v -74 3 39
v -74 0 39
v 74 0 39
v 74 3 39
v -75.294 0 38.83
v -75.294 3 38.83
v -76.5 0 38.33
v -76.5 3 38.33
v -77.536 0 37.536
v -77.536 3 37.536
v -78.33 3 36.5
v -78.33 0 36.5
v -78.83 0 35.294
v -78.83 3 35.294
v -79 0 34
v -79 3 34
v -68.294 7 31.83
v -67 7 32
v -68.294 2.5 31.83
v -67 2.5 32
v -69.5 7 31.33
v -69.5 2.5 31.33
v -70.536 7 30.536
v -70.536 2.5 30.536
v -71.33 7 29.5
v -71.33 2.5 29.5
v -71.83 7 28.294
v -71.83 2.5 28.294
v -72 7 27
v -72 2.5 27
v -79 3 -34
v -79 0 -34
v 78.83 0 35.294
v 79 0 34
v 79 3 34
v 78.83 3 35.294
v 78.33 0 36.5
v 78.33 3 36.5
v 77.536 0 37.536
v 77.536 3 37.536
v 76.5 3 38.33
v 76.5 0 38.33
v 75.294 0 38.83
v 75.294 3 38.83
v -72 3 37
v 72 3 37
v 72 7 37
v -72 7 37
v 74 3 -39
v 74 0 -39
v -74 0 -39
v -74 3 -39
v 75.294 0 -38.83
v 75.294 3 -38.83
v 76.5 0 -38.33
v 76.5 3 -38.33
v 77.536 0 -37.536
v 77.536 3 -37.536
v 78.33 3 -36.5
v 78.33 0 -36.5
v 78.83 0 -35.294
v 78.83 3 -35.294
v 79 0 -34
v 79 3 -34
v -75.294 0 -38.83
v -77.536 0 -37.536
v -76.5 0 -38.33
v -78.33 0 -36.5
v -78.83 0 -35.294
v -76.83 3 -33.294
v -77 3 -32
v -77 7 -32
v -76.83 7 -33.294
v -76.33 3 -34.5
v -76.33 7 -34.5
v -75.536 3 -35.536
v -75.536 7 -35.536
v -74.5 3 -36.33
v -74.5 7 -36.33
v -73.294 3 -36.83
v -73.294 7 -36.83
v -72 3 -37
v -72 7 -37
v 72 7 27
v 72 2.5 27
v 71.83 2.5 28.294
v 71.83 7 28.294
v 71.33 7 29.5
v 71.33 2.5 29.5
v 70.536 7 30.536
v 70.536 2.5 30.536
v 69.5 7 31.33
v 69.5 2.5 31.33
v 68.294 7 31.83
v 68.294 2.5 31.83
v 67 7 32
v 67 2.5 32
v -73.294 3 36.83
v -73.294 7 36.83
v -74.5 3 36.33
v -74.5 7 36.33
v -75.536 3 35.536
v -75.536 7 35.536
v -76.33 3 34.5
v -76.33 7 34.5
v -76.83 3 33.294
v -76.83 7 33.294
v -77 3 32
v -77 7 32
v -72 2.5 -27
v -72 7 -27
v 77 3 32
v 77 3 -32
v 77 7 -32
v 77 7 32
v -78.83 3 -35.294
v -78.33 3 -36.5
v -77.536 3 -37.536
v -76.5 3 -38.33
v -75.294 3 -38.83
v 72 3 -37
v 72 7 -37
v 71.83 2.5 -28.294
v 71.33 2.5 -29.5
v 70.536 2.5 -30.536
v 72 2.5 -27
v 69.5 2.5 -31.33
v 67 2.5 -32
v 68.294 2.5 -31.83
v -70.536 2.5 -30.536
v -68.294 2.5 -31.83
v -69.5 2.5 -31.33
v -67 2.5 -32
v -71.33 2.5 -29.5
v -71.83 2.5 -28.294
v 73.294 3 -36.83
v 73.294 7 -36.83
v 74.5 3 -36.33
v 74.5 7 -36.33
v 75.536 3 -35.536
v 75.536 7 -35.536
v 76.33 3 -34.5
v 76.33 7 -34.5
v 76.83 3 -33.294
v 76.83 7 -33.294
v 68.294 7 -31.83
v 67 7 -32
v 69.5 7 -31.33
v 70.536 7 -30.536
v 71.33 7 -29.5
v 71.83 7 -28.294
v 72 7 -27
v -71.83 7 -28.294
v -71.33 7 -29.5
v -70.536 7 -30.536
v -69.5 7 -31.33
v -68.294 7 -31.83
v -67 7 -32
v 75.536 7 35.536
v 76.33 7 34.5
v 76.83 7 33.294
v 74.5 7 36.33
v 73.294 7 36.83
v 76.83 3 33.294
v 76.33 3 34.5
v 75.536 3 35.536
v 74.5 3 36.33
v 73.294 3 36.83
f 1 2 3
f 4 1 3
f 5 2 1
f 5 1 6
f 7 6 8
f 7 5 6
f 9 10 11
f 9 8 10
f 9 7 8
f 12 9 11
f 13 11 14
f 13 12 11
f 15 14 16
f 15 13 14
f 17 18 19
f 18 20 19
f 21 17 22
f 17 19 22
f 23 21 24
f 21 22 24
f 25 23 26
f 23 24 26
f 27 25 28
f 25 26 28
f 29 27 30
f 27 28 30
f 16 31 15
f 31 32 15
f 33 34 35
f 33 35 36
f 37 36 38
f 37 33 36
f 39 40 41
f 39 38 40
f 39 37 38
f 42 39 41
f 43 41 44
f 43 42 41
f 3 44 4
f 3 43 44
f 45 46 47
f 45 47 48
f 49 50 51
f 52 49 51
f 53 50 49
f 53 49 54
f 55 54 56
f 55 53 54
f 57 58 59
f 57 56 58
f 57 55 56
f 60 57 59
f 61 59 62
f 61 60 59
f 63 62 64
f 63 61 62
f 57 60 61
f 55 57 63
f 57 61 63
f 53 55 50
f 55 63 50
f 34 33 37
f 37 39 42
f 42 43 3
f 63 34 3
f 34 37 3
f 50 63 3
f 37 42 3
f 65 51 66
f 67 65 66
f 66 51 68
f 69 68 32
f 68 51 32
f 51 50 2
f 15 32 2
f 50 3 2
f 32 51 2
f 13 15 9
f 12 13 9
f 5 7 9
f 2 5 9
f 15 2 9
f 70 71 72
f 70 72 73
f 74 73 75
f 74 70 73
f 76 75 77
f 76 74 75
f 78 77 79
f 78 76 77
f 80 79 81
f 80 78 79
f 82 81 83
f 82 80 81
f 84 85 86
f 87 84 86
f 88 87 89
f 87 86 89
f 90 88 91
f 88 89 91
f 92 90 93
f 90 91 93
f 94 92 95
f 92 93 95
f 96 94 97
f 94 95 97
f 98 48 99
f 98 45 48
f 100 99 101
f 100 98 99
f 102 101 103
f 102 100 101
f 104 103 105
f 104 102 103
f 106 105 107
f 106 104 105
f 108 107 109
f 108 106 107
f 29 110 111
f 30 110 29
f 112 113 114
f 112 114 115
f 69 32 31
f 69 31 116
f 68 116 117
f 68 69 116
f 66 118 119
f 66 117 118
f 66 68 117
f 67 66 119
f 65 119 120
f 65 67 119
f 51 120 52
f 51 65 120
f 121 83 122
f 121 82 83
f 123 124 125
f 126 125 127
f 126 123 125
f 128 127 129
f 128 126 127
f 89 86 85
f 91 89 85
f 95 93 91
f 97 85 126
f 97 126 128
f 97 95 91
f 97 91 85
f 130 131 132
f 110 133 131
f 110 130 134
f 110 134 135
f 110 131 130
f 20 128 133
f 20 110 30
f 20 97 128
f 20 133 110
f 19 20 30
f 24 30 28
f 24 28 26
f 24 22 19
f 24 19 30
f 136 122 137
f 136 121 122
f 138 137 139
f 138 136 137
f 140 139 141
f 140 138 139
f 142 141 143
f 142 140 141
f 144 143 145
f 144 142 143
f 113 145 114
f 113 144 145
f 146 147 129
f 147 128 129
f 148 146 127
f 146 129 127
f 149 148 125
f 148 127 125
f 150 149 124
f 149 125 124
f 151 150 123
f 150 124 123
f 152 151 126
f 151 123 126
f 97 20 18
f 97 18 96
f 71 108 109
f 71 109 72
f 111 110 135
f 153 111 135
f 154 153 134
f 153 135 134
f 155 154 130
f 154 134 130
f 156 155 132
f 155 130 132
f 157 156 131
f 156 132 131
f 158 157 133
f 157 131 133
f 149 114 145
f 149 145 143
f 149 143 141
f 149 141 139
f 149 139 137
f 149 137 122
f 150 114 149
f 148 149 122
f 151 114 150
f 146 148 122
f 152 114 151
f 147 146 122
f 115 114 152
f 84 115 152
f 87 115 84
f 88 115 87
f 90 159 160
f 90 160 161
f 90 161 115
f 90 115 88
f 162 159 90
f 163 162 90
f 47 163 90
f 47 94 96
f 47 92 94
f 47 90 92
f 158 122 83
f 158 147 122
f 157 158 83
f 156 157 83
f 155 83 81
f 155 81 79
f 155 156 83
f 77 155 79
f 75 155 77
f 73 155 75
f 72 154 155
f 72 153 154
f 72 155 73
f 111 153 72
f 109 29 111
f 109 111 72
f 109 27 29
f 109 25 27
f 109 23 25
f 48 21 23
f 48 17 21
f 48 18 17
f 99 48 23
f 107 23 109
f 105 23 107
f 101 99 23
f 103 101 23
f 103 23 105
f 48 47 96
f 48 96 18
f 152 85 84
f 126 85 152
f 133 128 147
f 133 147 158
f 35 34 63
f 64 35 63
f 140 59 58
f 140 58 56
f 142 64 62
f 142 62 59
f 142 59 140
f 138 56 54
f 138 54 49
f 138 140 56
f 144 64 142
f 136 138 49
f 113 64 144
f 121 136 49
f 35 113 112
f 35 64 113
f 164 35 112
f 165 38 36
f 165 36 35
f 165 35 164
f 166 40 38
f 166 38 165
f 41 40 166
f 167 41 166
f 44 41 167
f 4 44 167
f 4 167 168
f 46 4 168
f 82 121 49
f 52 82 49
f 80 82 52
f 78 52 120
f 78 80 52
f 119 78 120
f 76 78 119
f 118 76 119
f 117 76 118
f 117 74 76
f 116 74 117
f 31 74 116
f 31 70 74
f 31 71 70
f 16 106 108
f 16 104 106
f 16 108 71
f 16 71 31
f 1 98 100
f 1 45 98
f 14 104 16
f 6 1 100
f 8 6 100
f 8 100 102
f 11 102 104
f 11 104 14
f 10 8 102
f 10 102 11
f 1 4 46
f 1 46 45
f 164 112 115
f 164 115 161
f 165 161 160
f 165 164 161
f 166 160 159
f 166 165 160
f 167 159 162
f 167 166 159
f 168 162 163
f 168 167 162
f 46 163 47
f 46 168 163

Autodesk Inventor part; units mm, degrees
ref_plane "YZ Plane" through (0, 0, 0) normal (1, 0, 0) x (0, 1, 0)
ref_plane "XZ Plane" through (0, 0, 0) normal (0, 1, 0) x (-1, 0, 0)
ref_plane "XY Plane" through (0, 0, 0) normal (0, 0, 1) x (1, 0, 0)
sketch "Sketch1" plane through (0, 0, 0) normal (0, 1, 0) x (-1, 0, 0)
  line L0 (-70, 35) -> (70, 35)
  line L1 (75, 30) -> (75, -30)
  line L2 (70, -35) -> (-70, -35)
  line L3 (-75, -30) -> (-75, 30)
  line L4 (-75, 35) -> (75, -35) construction
  line L5 (75, 35) -> (-75, -35) construction
  arc A0 (75, 30) -> (70, 35) centre (70, 30) ccw
  arc A1 (70, -35) -> (75, -30) centre (70, -30) ccw
  arc A2 (-70, 35) -> (-75, 30) centre (-70, 30) ccw
  arc A3 (-75, -30) -> (-70, -35) centre (-70, -30) ccw
  line L6 (-72, 37) -> (72, 37)
  line L7 (77, 32) -> (77, -32)
  line L8 (72, -37) -> (-72, -37)
  line L9 (-77, -32) -> (-77, 32)
  line L10 (-77, 37) -> (77, -37) construction
  line L11 (77, 37) -> (-77, -37) construction
  arc A4 (77, 32) -> (72, 37) centre (72, 32) ccw
  arc A5 (72, -37) -> (77, -32) centre (72, -32) ccw
  arc A6 (-77, -32) -> (-72, -37) centre (-72, -32) ccw
  arc A7 (-72, 37) -> (-77, 32) centre (-72, 32) ccw
  line L12 (74, 39) -> (-74, 39)
  line L13 (-79, 34) -> (-79, -34)
  line L14 (-74, -39) -> (74, -39)
  line L15 (79, -34) -> (79, 34)
  line L16 (79, 39) -> (-79, -39) construction
  line L17 (-79, 39) -> (79, -39) construction
  arc A8 (79, 34) -> (74, 39) centre (74, 34) ccw
  arc A9 (-74, 39) -> (-79, 34) centre (-74, 34) ccw
  arc A10 (-79, -34) -> (-74, -39) centre (-74, -34) ccw
  arc A11 (74, -39) -> (79, -34) centre (74, -34) ccw
  line L18 (-22.75, 23.25) -> (-35.25, 23.25) construction
  line L19 (-35.25, 23.25) -> (-35.25, 19) construction
  line L20 (-35.25, 10.75) -> (-22.75, 10.75) construction
  line L21 (-22.75, 10.75) -> (-22.75, 15) construction
  line L22 (56.9183, 17) -> (21.35, 17) construction
  line L23 (40.8, -24) -> (40.8, -20.1) construction
  line L24 (-55.8, 24) -> (-55.8, 12) construction
  line L25 (-20.25, 15.5) -> (-22.25, 15.5) construction
  line L26 (-22.25, 18.5) -> (-20.25, 18.5) construction
  line L27 (-35.75, 15.5) -> (-37.75, 15.5) construction
  line L28 (-37.75, 18.5) -> (-35.75, 18.5) construction
  line L29 (-40.55, 18.5) -> (-53.5, 18.5) construction
  line L30 (-40.55, 15.5) -> (-53.5, 15.5) construction
  line L31 (-60, 8.5) -> (45, 8.5) construction
  line L32 (38.5, 20.5) -> (37, 20.5) construction
  line L33 (37, 13.5) -> (38.5, 13.5) construction
  line L34 (-60, 5) -> (-60, -25) construction
  line L35 (21.35, -8.5) -> (45, -8.5) construction
  line L36 (-29, 20.0147) -> (-29, -25.5) construction
  line L37 (31.2062, 0) -> (-4.2501, 0) construction
  line L38 (-35.25, 6.25) -> (-35.25, 2) construction
  line L39 (-22.75, 6.25) -> (-35.25, 6.25) construction
  line L40 (-22.75, -6.25) -> (-22.75, -2) construction
  line L41 (-35.25, -6.25) -> (-22.75, -6.25) construction
  line L42 (-22.25, 1.5) -> (-20.25, 1.5) construction
  line L43 (-20.25, -1.5) -> (-22.25, -1.5) construction
  line L44 (38.5, 3.5) -> (37, 3.5) construction
  line L45 (37, -3.5) -> (38.5, -3.5) construction
  line L46 (-22.75, -10.75) -> (-35.25, -10.75) construction
  line L47 (-22.75, -23.25) -> (-22.75, -19) construction
  line L48 (-35.25, -23.25) -> (-22.75, -23.25) construction
  line L49 (56.3008, -17) -> (21.35, -17) construction
  line L50 (38.5, -13.5) -> (37, -13.5) construction
  line L51 (37, -20.5) -> (38.5, -20.5) construction
  line L52 (-20.25, -18.5) -> (-22.25, -18.5) construction
  line L53 (44.5, 5.5) -> (43.5, 5.5) construction
  line L54 (41.3, 11.5) -> (43.5, 11.5) construction
  line L55 (-37.75, -15.5) -> (-35.75, -15.5) construction
  line L56 (-35.75, -18.5) -> (-37.75, -18.5) construction
  line L57 (-40.55, -18.5) -> (-53.5, -18.5) construction
  line L58 (-37.75, 1.5) -> (-35.75, 1.5) construction
  line L59 (-35.75, -1.5) -> (-37.75, -1.5) construction
  line L60 (-40.55, -1.5) -> (-53.5, -1.5) construction
  line L61 (-58.5, 5.5) -> (-59.5, 5.5) construction
  line L62 (-59.5, 11.5) -> (-58.5, 11.5) construction
  line L63 (38.5, 5.5) -> (37, 5.5) construction
  line L64 (37, 5.5) -> (37, 11.5) construction
  line L65 (37, 11.5) -> (38.5, 11.5) construction
  line L66 (-53.5, 5.5) -> (-52.5, 5.5) construction
  line L67 (-52.5, 5.5) -> (-52.5, 11.5) construction
  line L68 (-52.5, 11.5) -> (-53.5, 11.5) construction
  line L69 (-54, 24) -> (-54, 19) construction
  line L70 (-54, 5) -> (-54, 2) construction
  arc A12 (-12.95, 13.5) -> (-12.95, 3.5) centre (-12.95, 8.5) ccw construction
  arc A13 (31, 3.5) -> (31, 13.5) centre (31, 8.5) ccw construction
  arc A14 (-12.95, -3.5) -> (-12.95, -13.5) centre (-12.95, -8.5) ccw construction
  arc A15 (31, -13.5) -> (31, -3.5) centre (31, -8.5) ccw construction
  line L71 (-12.95, 13.5) -> (31, 13.5) construction
  line L72 (-12.95, 3.5) -> (31, 3.5) construction
  line L73 (-12.95, -3.5) -> (31, -3.5) construction
  line L74 (-12.95, -13.5) -> (31, -13.5) construction
  arc A16 (-45.05, -13.5) -> (-45.05, -3.5) centre (-45.05, -8.5) ccw construction
  line L75 (43.5, -24) -> (43.5, -19.6) construction
  line L76 (-58.5, 24) -> (-58.5, 11.5) construction
  arc A17 (-46, -3.5) -> (-46, -13.5) centre (-46, -8.5) ccw construction
  arc A18 (-46, 13.5) -> (-46, 3.5) centre (-46, 8.5) ccw construction
  line L77 (-45.05, -13.5) -> (-46, -13.5) construction
  line L78 (-46, -3.5) -> (-45.05, -3.5) construction
  line L79 (-46, 3.5) -> (-45.05, 3.5) construction
  line L80 (-45.05, 13.5) -> (-46, 13.5) construction
  arc A19 (-45.05, 3.5) -> (-45.05, 13.5) centre (-45.05, 8.5) ccw construction
  line L81 (29.8763, -15.5) -> (-17.45, -15.5) construction
  line L82 (29.8763, -18.5) -> (-17.45, -18.5) construction
  line L83 (29.8763, -1.5) -> (-17.45, -1.5) construction
  line L84 (29.8763, 1.5) -> (-17.45, 1.5) construction
  line L85 (29.8763, 15.5) -> (-17.45, 15.5) construction
  line L86 (29.8763, 18.5) -> (-17.45, 18.5) construction
  arc A20 (32, -14.4) -> (29.8763, -15.5) centre (32, -17) ccw construction
  arc A21 (29.8763, -18.5) -> (32, -19.6) centre (32, -17) ccw construction
  arc A22 (32, 2.6) -> (29.8763, 1.5) centre (32, 0) ccw construction
  arc A23 (29.8763, -1.5) -> (32, -2.6) centre (32, 0) ccw construction
  arc A24 (32, 19.6) -> (29.8763, 18.5) centre (32, 17) ccw construction
  arc A25 (29.8763, 15.5) -> (32, 14.4) centre (32, 17) ccw construction
  arc A26 (34.4725, -25.0625) -> (31, -22) centre (31, -25.5) ccw construction
  arc A27 (-12.95, -22) -> (-16.4225, -25.0625) centre (-12.95, -25.5) ccw construction
  arc A28 (35.7697, -24) -> (31, -20.5) centre (31, -25.5) ccw construction
  line L87 (31, -20.5) -> (-12.95, -20.5) construction
  line L88 (34.9686, -25.5) -> (44.5, -25.5) construction
  line L89 (31, -22) -> (-12.95, -22) construction
  arc A29 (-12.95, -20.5) -> (-17.7197, -24) centre (-12.95, -25.5) ccw construction
  arc A30 (-17.6941, 23.9209) -> (-12.95, 20.5) centre (-12.95, 25.5) ccw construction
  arc A31 (-16.4225, 25.0625) -> (-12.95, 22) centre (-12.95, 25.5) ccw construction
  line L90 (31, 22) -> (-12.95, 22) construction
  line L91 (31, 20.5) -> (-12.95, 20.5) construction
  line L92 (35.7697, 24) -> (40.8, 24) construction
  line L93 (44.5, 25.5) -> (34.9686, 25.5) construction
  arc A32 (31, 22) -> (34.4725, 25.0625) centre (31, 25.5) ccw construction
  arc A33 (31, 20.5) -> (35.7697, 24) centre (31, 25.5) ccw construction
  arc A34 (-41.5775, -25.0625) -> (-45.05, -22) centre (-45.05, -25.5) ccw construction
  arc A35 (-46, -22) -> (-49.4725, -25.0625) centre (-46, -25.5) ccw construction
  line L94 (-45.05, -20.5) -> (-46, -20.5) construction
  line L95 (-45.05, -22) -> (-46, -22) construction
  arc A36 (-46, -20.5) -> (-50.7697, -24) centre (-46, -25.5) ccw construction
  arc A37 (-40.2803, -24) -> (-45.05, -20.5) centre (-45.05, -25.5) ccw construction
  line L96 (-17.7197, -24) -> (-40.2803, -24) construction
  line L97 (-50.7697, -24) -> (-58.5, -24) construction
  line L98 (-59.5, -25.5) -> (-49.9686, -25.5) construction
  line L99 (-17.2197, -25.5) -> (-16.9186, -25.5) construction
  line L100 (-45.05, 20.5) -> (-46, 20.5) construction
  line L101 (-45.05, 22) -> (-46, 22) construction
  arc A38 (-49.4725, 25.0625) -> (-46, 22) centre (-46, 25.5) ccw construction
  arc A39 (-45.05, 22) -> (-41.5775, 25.0625) centre (-45.05, 25.5) ccw construction
  arc A40 (-50.7697, 24) -> (-46, 20.5) centre (-46, 25.5) ccw construction
  arc A41 (-45.05, 20.5) -> (-40.336, 23.8333) centre (-45.05, 25.5) ccw construction
  line L102 (-16.9186, 25.5) -> (-17.2197, 25.5) construction
  line L103 (-49.9686, 25.5) -> (-59.5, 25.5) construction
  line L104 (-58.5, 24) -> (-50.7697, 24) construction
  line L105 (-40.3074, 24) -> (-17.7197, 24) construction
  line L106 (-17.7197, -24) -> (-17.7197, -25) construction
  line L107 (-40.2803, -24) -> (-40.2803, -25) construction
  line L108 (-40.3074, 24) -> (-40.3074, 25) construction
  line L109 (-17.7197, 24.0788) -> (-17.7197, 25) construction
  line L110 (43.5, 11.5) -> (44.5, 11.5) construction
  line L111 (43.5, 5.5) -> (41.3, 5.5) construction
  line L112 (-56.3, 11.5) -> (-58.5, 11.5) construction
  line L113 (-56.3, 5.5) -> (-58.5, 5.5) construction
  line L114 (-17.95, -21) -> (-19.75, -21) construction
  line L115 (-19.75, -13) -> (-17.95, -13) construction
  line L116 (-17.95, -4) -> (-19.75, -4) construction
  line L117 (-19.75, 4) -> (-17.95, 4) construction
  line L118 (-17.95, 13) -> (-19.75, 13) construction
  line L119 (-19.75, 21) -> (-17.95, 21) construction
  line L120 (-38.25, -21) -> (-40.05, -21) construction
  line L121 (-40.05, -13) -> (-38.25, -13) construction
  line L122 (-38.25, -4) -> (-40.05, -4) construction
  line L123 (-40.05, 4) -> (-38.25, 4) construction
  line L124 (-38.25, 13) -> (-40.05, 13) construction
  line L125 (-40.05, 21) -> (-38.25, 21) construction
  line L126 (-17.95, -13) -> (-17.95, -15) construction
  line L127 (-17.95, -19) -> (-17.95, -21) construction
  line L128 (-19.75, -21) -> (-19.75, -19) construction
  line L129 (-17.95, 4) -> (-17.95, 2) construction
  line L130 (-17.95, -2) -> (-17.95, -4) construction
  line L131 (-19.75, -4) -> (-19.75, -2) construction
  line L132 (-19.75, 2) -> (-19.75, 4) construction
  line L133 (-17.95, 21) -> (-17.95, 19) construction
  line L134 (-17.95, 15) -> (-17.95, 13) construction
  line L135 (-19.75, 13) -> (-19.75, 15) construction
  line L136 (-19.75, 19) -> (-19.75, 21) construction
  line L137 (-38.25, -13) -> (-38.25, -15) construction
  line L138 (-38.25, -19) -> (-38.25, -21) construction
  line L139 (-40.05, -21) -> (-40.05, -19) construction
  line L140 (-40.05, -15) -> (-40.05, -13) construction
  line L141 (-38.25, 4) -> (-38.25, 2) construction
  line L142 (-38.25, -2) -> (-38.25, -4) construction
  line L143 (-40.05, -4) -> (-40.05, -2) construction
  line L144 (-40.05, 2) -> (-40.05, 4) construction
  line L145 (-38.25, 21) -> (-38.25, 19) construction
  line L146 (-38.25, 15) -> (-38.25, 13) construction
  line L147 (-40.05, 13) -> (-40.05, 15) construction
  line L148 (-40.05, 19) -> (-40.05, 21) construction
  line L149 (38.5, -11.5) -> (37, -11.5) construction
  line L150 (37, -11.5) -> (37, -5.5) construction
  line L151 (37, -5.5) -> (38.5, -5.5) construction
  line L152 (39, -21) -> (39, -24) construction
  arc A42 (-19.75, -19) -> (-20.25, -18.5) centre (-20.25, -19) ccw construction
  arc A43 (-17.45, -18.5) -> (-17.95, -19) centre (-17.45, -19) ccw construction
  arc A44 (-19.75, -2) -> (-20.25, -1.5) centre (-20.25, -2) ccw construction
  arc A45 (-17.45, -1.5) -> (-17.95, -2) centre (-17.45, -2) ccw construction
  arc A46 (-17.95, 2) -> (-17.45, 1.5) centre (-17.45, 2) ccw construction
  arc A47 (-20.25, 1.5) -> (-19.75, 2) centre (-20.25, 2) ccw construction
  arc A48 (-19.75, 15) -> (-20.25, 15.5) centre (-20.25, 15) ccw construction
  arc A49 (-17.45, 15.5) -> (-17.95, 15) centre (-17.45, 15) ccw construction
  arc A50 (-17.95, 19) -> (-17.45, 18.5) centre (-17.45, 19) ccw construction
  arc A51 (-20.25, 18.5) -> (-19.75, 19) centre (-20.25, 19) ccw construction
  arc A52 (-38.25, 19) -> (-37.75, 18.5) centre (-37.75, 19) ccw construction
  arc A53 (-40.55, 18.5) -> (-40.05, 19) centre (-40.55, 19) ccw construction
  arc A54 (-40.05, 15) -> (-40.55, 15.5) centre (-40.55, 15) ccw construction
  arc A55 (-37.75, 15.5) -> (-38.25, 15) centre (-37.75, 15) ccw construction
  arc A56 (-38.25, 2) -> (-37.75, 1.5) centre (-37.75, 2) ccw construction
  arc A57 (-40.55, 1.5) -> (-40.05, 2) centre (-40.55, 2) ccw construction
  arc A58 (-40.05, -2) -> (-40.55, -1.5) centre (-40.55, -2) ccw construction
  arc A59 (-37.75, -1.5) -> (-38.25, -2) centre (-37.75, -2) ccw construction
  arc A60 (-38.25, -15) -> (-37.75, -15.5) centre (-37.75, -15) ccw construction
  arc A61 (-40.55, -15.5) -> (-40.05, -15) centre (-40.55, -15) ccw construction
  arc A62 (-37.75, -18.5) -> (-38.25, -19) centre (-37.75, -19) ccw construction
  arc A63 (-40.05, -19) -> (-40.55, -18.5) centre (-40.55, -19) ccw construction
  line L153 (36.5, -19.6) -> (32, -19.6) construction
  line L154 (37, -13.5) -> (37, -13.9) construction
  line L155 (32, -14.4) -> (36.5, -14.4) construction
  line L156 (36.5, -2.6) -> (32, -2.6) construction
  line L157 (37, 3.5) -> (37, 3.1) construction
  line L158 (37, -3.1) -> (37, -3.5) construction
  line L159 (32, 2.6) -> (36.5, 2.6) construction
  line L160 (36.5, 14.4) -> (32, 14.4) construction
  line L161 (37, 20.5) -> (37, 20.1) construction
  line L162 (37, 13.9) -> (37, 13.5) construction
  line L163 (32, 19.6) -> (36.5, 19.6) construction
  arc A64 (36.5, -14.4) -> (37, -13.9) centre (36.5, -13.9) ccw construction
  arc A65 (39, -12) -> (38.5, -11.5) centre (38.5, -12) ccw construction
  arc A66 (38.5, -5.5) -> (39, -5) centre (38.5, -5) ccw construction
  arc A67 (39, 5) -> (38.5, 5.5) centre (38.5, 5) ccw construction
  arc A68 (38.5, 11.5) -> (39, 12) centre (38.5, 12) ccw construction
  arc A69 (37, -3.1) -> (36.5, -2.6) centre (36.5, -3.1) ccw construction
  arc A70 (36.5, 2.6) -> (37, 3.1) centre (36.5, 3.1) ccw construction
  arc A71 (37, 13.9) -> (36.5, 14.4) centre (36.5, 13.9) ccw construction
  arc A72 (36.5, 19.6) -> (37, 20.1) centre (36.5, 20.1) ccw construction
  line L164 (43.5, -2.6) -> (43.5, 2.6) construction
  line L165 (43.5, -2.6) -> (41.3, -2.6) construction
  line L166 (37, -20.5) -> (37, -20.1) construction
  arc A73 (37, -20.1) -> (36.5, -19.6) centre (36.5, -20.1) ccw construction
  line L167 (39, -13) -> (39, -12) construction
  line L168 (39, 4) -> (39, 5) construction
  line L169 (39, 21) -> (39, 24) construction
  line L170 (43.5, -19.6) -> (43.5, -14.4) construction
  line L171 (43.5, -19.6) -> (41.3, -19.6) construction
  line L172 (43.5, -24) -> (40.8, -24) construction
  line L173 (40.8, -24) -> (39, -24) construction
  line L174 (39, -24) -> (35.7697, -24) construction
  line L175 (41.3, -14.4) -> (43.5, -14.4) construction
  line L176 (43.5, -14.4) -> (43.5, -2.6) construction
  line L177 (40.8, -13.9) -> (40.8, -3.1) construction
  line L178 (39, -4) -> (39, -5) construction
  line L179 (43.5, 2.6) -> (43.5, 5.5) construction
  line L180 (41.3, 2.6) -> (43.5, 2.6) construction
  line L181 (40.8, 3.1) -> (40.8, 5) construction
  line L182 (43.5, 14.4) -> (43.5, 19.6) construction
  line L183 (43.5, 14.4) -> (41.3, 14.4) construction
  line L184 (45, -25) -> (45, 5) construction
  line L185 (43.5, 19.6) -> (43.5, 24) construction
  line L186 (40.8, 20.1) -> (40.8, 24) construction
  line L187 (41.3, 19.6) -> (43.5, 19.6) construction
  line L188 (43.5, 11.5) -> (43.5, 14.4) construction
  line L189 (40.8, 24) -> (43.5, 24) construction
  line L190 (40.8, 12) -> (40.8, 13.9) construction
  line L191 (39, 13) -> (39, 12) construction
  arc A74 (38.5, -13.5) -> (39, -13) centre (38.5, -13) ccw construction
  arc A75 (39, -4) -> (38.5, -3.5) centre (38.5, -4) ccw construction
  arc A76 (38.5, 3.5) -> (39, 4) centre (38.5, 4) ccw construction
  arc A77 (39, 13) -> (38.5, 13.5) centre (38.5, 13) ccw construction
  arc A78 (38.5, 20.5) -> (39, 21) centre (38.5, 21) ccw construction
  arc A79 (41.3, -19.6) -> (40.8, -20.1) centre (41.3, -20.1) ccw construction
  arc A80 (40.8, -13.9) -> (41.3, -14.4) centre (41.3, -13.9) ccw construction
  arc A81 (41.3, -2.6) -> (40.8, -3.1) centre (41.3, -3.1) ccw construction
  arc A82 (40.8, 3.1) -> (41.3, 2.6) centre (41.3, 3.1) ccw construction
  arc A83 (41.3, 14.4) -> (40.8, 13.9) centre (41.3, 13.9) ccw construction
  arc A84 (40.8, 20.1) -> (41.3, 19.6) centre (41.3, 20.1) ccw construction
  line L192 (40.8, 5.5) -> (40.8, 11.5) construction
  line L193 (-54, 15) -> (-54, 12) construction
  line L194 (-53.5, 1.5) -> (-40.55, 1.5) construction
  line L195 (-54, -2) -> (-54, -15) construction
  line L196 (-54, -19) -> (-54, -24) construction
  line L197 (-53.5, -15.5) -> (-40.55, -15.5) construction
  line L198 (-58.5, 5.5) -> (-58.5, -24) construction
  arc A85 (-54, 19) -> (-53.5, 18.5) centre (-53.5, 19) ccw construction
  arc A86 (-53.5, 15.5) -> (-54, 15) centre (-53.5, 15) ccw construction
  arc A87 (-54, 12) -> (-53.5, 11.5) centre (-53.5, 12) ccw construction
  arc A88 (-53.5, 5.5) -> (-54, 5) centre (-53.5, 5) ccw construction
  arc A89 (-54, 2) -> (-53.5, 1.5) centre (-53.5, 2) ccw construction
  arc A90 (-53.5, -1.5) -> (-54, -2) centre (-53.5, -2) ccw construction
  arc A91 (-54, -15) -> (-53.5, -15.5) centre (-53.5, -15) ccw construction
  arc A92 (-53.5, -18.5) -> (-54, -19) centre (-53.5, -19) ccw construction
  arc A93 (39, -21) -> (38.5, -20.5) centre (38.5, -21) ccw construction
  arc A94 (41.3, 5.5) -> (40.8, 5) centre (41.3, 5) ccw construction
  arc A95 (40.8, 12) -> (41.3, 11.5) centre (41.3, 12) ccw construction
  line L199 (40.8, 5.5) -> (41.3, 5.5) construction
  line L200 (40.8, 11.5) -> (41.3, 11.5) construction
  arc A96 (45, 5) -> (44.5, 5.5) centre (44.5, 5) ccw construction
  line L201 (45, 25) -> (45, 12) construction
  arc A97 (44.5, 11.5) -> (45, 12) centre (44.5, 12) ccw construction
  line L202 (45, 5) -> (45, 12) construction
  arc A98 (-59.5, 5.5) -> (-60, 5) centre (-59.5, 5) ccw construction
  line L203 (-60, 12) -> (-60, 25) construction
  arc A99 (-60, 12) -> (-59.5, 11.5) centre (-59.5, 12) ccw construction
  line L204 (-60, 5) -> (-60, 12) construction
  line L205 (-55.8, -24) -> (-55.8, 5) construction
  arc A100 (-56.3, 11.5) -> (-55.8, 12) centre (-56.3, 12) ccw construction
  arc A101 (-55.8, 5) -> (-56.3, 5.5) centre (-56.3, 5) ccw construction
  line L206 (-55.8, 5.5) -> (-55.8, 11.5) construction
  line L207 (-56.3, 11.5) -> (-55.8, 11.5) construction
  line L208 (-56.3, 5.5) -> (-55.8, 5.5) construction
  arc A102 (44.5, -25.5) -> (45, -25) centre (44.5, -25) ccw construction
  arc A103 (34.4725, -25.0625) -> (34.9686, -25.5) centre (34.9686, -25) ccw construction
  arc A104 (-16.9186, -25.5) -> (-16.4225, -25.0625) centre (-16.9186, -25) ccw construction
  arc A105 (-41.5775, -25.0625) -> (-41.0814, -25.5) centre (-41.0814, -25) ccw construction
  arc A106 (-49.9686, -25.5) -> (-49.4725, -25.0625) centre (-49.9686, -25) ccw construction
  arc A107 (-60, -25) -> (-59.5, -25.5) centre (-59.5, -25) ccw construction
  arc A108 (-59.5, 25.5) -> (-60, 25) centre (-59.5, 25) ccw construction
  arc A109 (-49.4725, 25.0625) -> (-49.9686, 25.5) centre (-49.9686, 25) ccw construction
  arc A110 (-41.0814, 25.5) -> (-41.5775, 25.0625) centre (-41.0814, 25) ccw construction
  arc A111 (-16.4225, 25.0625) -> (-16.9186, 25.5) centre (-16.9186, 25) ccw construction
  arc A112 (34.9686, 25.5) -> (34.4725, 25.0625) centre (34.9686, 25) ccw construction
  arc A113 (45, 25) -> (44.5, 25.5) centre (44.5, 25) ccw construction
  line L209 (-22.75, -19) -> (-22.75, -15) construction
  line L210 (-22.75, -15) -> (-22.75, -10.75) construction
  line L211 (-35.25, -15) -> (-35.25, -19) construction
  line L212 (-35.25, -19) -> (-35.25, -23.25) construction
  arc A114 (-22.25, -18.5) -> (-22.75, -19) centre (-22.25, -19) ccw construction
  arc A115 (-22.75, -15) -> (-22.25, -15.5) centre (-22.25, -15) ccw construction
  arc A116 (-35.25, -19) -> (-35.75, -18.5) centre (-35.75, -19) ccw construction
  arc A117 (-17.95, -15) -> (-17.45, -15.5) centre (-17.45, -15) ccw construction
  line L213 (-19.75, -13) -> (-19.75, -15) construction
  line L214 (-20.25, -15.5) -> (-22.25, -15.5) construction
  arc A118 (-20.25, -15.5) -> (-19.75, -15) centre (-20.25, -15) ccw construction
  line L215 (-35.25, -10.75) -> (-35.25, -15) construction
  arc A119 (-35.75, -15.5) -> (-35.25, -15) centre (-35.75, -15) ccw construction
  line L216 (-22.75, -2) -> (-22.75, 2) construction
  line L217 (-22.75, 2) -> (-22.75, 6.25) construction
  line L218 (-35.25, -2) -> (-35.25, -6.25) construction
  line L219 (-35.25, 2) -> (-35.25, -2) construction
  line L220 (-22.75, 15) -> (-22.75, 19) construction
  line L221 (-22.75, 19) -> (-22.75, 23.25) construction
  line L222 (-35.25, 19) -> (-35.25, 15) construction
  line L223 (-35.25, 15) -> (-35.25, 10.75) construction
  arc A120 (-22.25, -1.5) -> (-22.75, -2) centre (-22.25, -2) ccw construction
  arc A121 (-22.75, 2) -> (-22.25, 1.5) centre (-22.25, 2) ccw construction
  arc A122 (-35.25, -2) -> (-35.75, -1.5) centre (-35.75, -2) ccw construction
  arc A123 (-35.75, 1.5) -> (-35.25, 2) centre (-35.75, 2) ccw construction
  arc A124 (-22.25, 15.5) -> (-22.75, 15) centre (-22.25, 15) ccw construction
  arc A125 (-22.75, 19) -> (-22.25, 18.5) centre (-22.25, 19) ccw construction
  arc A126 (-35.75, 18.5) -> (-35.25, 19) centre (-35.75, 19) ccw construction
  arc A127 (-35.25, 15) -> (-35.75, 15.5) centre (-35.75, 15) ccw construction
  arc A128 (-17.7197, -25) -> (-17.2197, -25.5) centre (-17.2197, -25) ccw construction
  line L224 (-41.0814, -25.5) -> (-40.7803, -25.5) construction
  line L225 (-40.7803, -25.5) -> (-17.2197, -25.5) construction
  arc A129 (-40.7803, -25.5) -> (-40.2803, -25) centre (-40.7803, -25) ccw construction
  arc A130 (-17.2197, 25.5) -> (-17.7197, 25) centre (-17.2197, 25) ccw construction
  line L226 (-41.0814, 25.5) -> (-40.8074, 25.5) construction
  line L227 (-40.8074, 25.5) -> (-17.2197, 25.5) construction
  arc A131 (-40.3074, 25) -> (-40.8074, 25.5) centre (-40.8074, 25) ccw construction
  arc A132 (-17.7197, 24.0788) -> (-17.6941, 23.9209) centre (-17.2197, 24.0788) ccw construction
  arc A133 (-40.336, 23.8333) -> (-40.3074, 24) centre (-40.8074, 24) ccw construction
  line L228 (-23.25, 25.25) -> (-34.75, 25.25)
  line L229 (-37.25, 22.75) -> (-37.25, -22.75)
  line L230 (-34.75, -25.25) -> (-23.25, -25.25)
  line L231 (-20.75, -22.75) -> (-20.75, 22.75)
  line L232 (-20.75, 25.25) -> (-37.25, -25.25) construction
  line L233 (-37.25, 25.25) -> (-20.75, -25.25) construction
  arc A134 (-23.25, -25.25) -> (-20.75, -22.75) centre (-23.25, -22.75) ccw
  arc A135 (-37.25, -22.75) -> (-34.75, -25.25) centre (-34.75, -22.75) ccw
  arc A136 (-20.75, 22.75) -> (-23.25, 25.25) centre (-23.25, 22.75) ccw
  arc A137 (-34.75, 25.25) -> (-37.25, 22.75) centre (-34.75, 22.75) ccw
  line L234 (67, 32) -> (-67, 32)
  line L235 (-72, 27) -> (-72, -27)
  line L236 (-67, -32) -> (67, -32)
  line L237 (72, -27) -> (72, 27)
  line L238 (72, 32) -> (-72, -32) construction
  line L239 (-72, 32) -> (72, -32) construction
  arc A138 (67, -32) -> (72, -27) centre (67, -27) ccw
  arc A139 (-72, -27) -> (-67, -32) centre (-67, -27) ccw
  arc A140 (-67, 32) -> (-72, 27) centre (-67, 27) ccw
  arc A141 (72, 27) -> (67, 32) centre (67, 27) ccw
  line L240 (26.3397, -21.5) -> (-2.6603, -21.5)
  line L241 (-2.6603, -21.5) -> (-2.6603, 21.5)
  line L242 (-2.6603, 21.5) -> (26.3397, 21.5)
  line L243 (26.3397, 21.5) -> (26.3397, -21.5)
  line L244 (26.3397, -21.5) -> (-2.6603, 21.5) construction
  line L245 (-2.6603, -21.5) -> (26.3397, 21.5) construction
  point P0 (0, 0)
  point P1 (0, 0)
  point P2 (0, 0)
  point P3 (-29, -17)
  point P4 (-29, 0)
  point P5 (-29, 17)
  point P6 (43.5, -8.5)
  point P7 (11.8397, 0)
  point P8 (11.8397, 0)
  dimension "d0" = 150
  dimension "d1" = 70
  dimension "d2" = 5
  dimension "d3" = 2
  dimension "d4" = 2
  dimension "d5" = 5
  dimension "d6" = 4
  dimension "d7" = 4
  dimension "d8" = 5
  dimension "d13" = 7
  dimension "d14" = 17
  dimension "d15" = 17
  dimension "d16" = 17
  dimension "d17" = 6
  dimension "d18" = 6
  dimension "d19" = 5
  dimension "d20" = 1.5
  dimension "d21" = 1.5
  dimension "d22" = 1.5
  dimension "d23" = 17
  dimension "d24" = 17
  dimension "d25" = 2.7
  dimension "d26" = 2.7
  dimension "d27" = 6
  dimension "d28" = 25
  dimension "d29" = 5
  dimension "d30" = 1.8
  dimension "d31" = 8
  dimension "d32" = 5
  dimension "d33" = 5
  dimension "d34" = 12.5
  dimension "d35" = 51
  dimension "d36" = 8
  dimension "d37" = 7
  dimension "d38" = 7
  dimension "d39" = 2
  dimension "d40" = 1.8
  dimension "d41" = 8
  dimension "d42" = 1.8
  dimension "d43" = 2.7
  dimension "d44" = 1.5
  dimension "d45" = 3
  dimension "d46" = 3
  dimension "d47" = 3
  dimension "d48" = 0.5
  dimension "d49" = 68
  dimension "d50" = 5.2
  dimension "d51" = 7
  dimension "d52" = 5.2
  dimension "d53" = 5.2
  dimension "d54" = 1.5
  dimension "d55" = 1.5
  dimension "d56" = 0.5
  dimension "d57" = 0.5
  dimension "d58" = 0.5
  dimension "d59" = 6
  dimension "d60" = 0.5
  dimension "d61" = 12.5
  dimension "d62" = 3
  dimension "d63" = 3
  dimension "d64" = 12.5
  dimension "d65" = 12.5
  dimension "d66" = 0.5
  dimension "d67" = 0.5
extrude "Extrusion1" add sketch "Sketch1" along normal blind 7 contours L0 A0 L1 A1 L2 A3 L3 A2 | L6 A4 L7 A5 L8 A6 L9 A7
extrude "Extrusion2" add sketch "Sketch1" along normal blind 3 contours A8 L15 A11 L14 A10 L13 A9 L12
extrude "Extrusion3" add sketch "Sketch1" along normal blind 2.5 contours A136 L231 A134 L230 A135 L229 A137 L228 | A141 L237 A138 L236 A139 L235 A140 L234 | L240 L241 L242 L243
properties part number "Box2_bottom" material "PPS Plastic"
